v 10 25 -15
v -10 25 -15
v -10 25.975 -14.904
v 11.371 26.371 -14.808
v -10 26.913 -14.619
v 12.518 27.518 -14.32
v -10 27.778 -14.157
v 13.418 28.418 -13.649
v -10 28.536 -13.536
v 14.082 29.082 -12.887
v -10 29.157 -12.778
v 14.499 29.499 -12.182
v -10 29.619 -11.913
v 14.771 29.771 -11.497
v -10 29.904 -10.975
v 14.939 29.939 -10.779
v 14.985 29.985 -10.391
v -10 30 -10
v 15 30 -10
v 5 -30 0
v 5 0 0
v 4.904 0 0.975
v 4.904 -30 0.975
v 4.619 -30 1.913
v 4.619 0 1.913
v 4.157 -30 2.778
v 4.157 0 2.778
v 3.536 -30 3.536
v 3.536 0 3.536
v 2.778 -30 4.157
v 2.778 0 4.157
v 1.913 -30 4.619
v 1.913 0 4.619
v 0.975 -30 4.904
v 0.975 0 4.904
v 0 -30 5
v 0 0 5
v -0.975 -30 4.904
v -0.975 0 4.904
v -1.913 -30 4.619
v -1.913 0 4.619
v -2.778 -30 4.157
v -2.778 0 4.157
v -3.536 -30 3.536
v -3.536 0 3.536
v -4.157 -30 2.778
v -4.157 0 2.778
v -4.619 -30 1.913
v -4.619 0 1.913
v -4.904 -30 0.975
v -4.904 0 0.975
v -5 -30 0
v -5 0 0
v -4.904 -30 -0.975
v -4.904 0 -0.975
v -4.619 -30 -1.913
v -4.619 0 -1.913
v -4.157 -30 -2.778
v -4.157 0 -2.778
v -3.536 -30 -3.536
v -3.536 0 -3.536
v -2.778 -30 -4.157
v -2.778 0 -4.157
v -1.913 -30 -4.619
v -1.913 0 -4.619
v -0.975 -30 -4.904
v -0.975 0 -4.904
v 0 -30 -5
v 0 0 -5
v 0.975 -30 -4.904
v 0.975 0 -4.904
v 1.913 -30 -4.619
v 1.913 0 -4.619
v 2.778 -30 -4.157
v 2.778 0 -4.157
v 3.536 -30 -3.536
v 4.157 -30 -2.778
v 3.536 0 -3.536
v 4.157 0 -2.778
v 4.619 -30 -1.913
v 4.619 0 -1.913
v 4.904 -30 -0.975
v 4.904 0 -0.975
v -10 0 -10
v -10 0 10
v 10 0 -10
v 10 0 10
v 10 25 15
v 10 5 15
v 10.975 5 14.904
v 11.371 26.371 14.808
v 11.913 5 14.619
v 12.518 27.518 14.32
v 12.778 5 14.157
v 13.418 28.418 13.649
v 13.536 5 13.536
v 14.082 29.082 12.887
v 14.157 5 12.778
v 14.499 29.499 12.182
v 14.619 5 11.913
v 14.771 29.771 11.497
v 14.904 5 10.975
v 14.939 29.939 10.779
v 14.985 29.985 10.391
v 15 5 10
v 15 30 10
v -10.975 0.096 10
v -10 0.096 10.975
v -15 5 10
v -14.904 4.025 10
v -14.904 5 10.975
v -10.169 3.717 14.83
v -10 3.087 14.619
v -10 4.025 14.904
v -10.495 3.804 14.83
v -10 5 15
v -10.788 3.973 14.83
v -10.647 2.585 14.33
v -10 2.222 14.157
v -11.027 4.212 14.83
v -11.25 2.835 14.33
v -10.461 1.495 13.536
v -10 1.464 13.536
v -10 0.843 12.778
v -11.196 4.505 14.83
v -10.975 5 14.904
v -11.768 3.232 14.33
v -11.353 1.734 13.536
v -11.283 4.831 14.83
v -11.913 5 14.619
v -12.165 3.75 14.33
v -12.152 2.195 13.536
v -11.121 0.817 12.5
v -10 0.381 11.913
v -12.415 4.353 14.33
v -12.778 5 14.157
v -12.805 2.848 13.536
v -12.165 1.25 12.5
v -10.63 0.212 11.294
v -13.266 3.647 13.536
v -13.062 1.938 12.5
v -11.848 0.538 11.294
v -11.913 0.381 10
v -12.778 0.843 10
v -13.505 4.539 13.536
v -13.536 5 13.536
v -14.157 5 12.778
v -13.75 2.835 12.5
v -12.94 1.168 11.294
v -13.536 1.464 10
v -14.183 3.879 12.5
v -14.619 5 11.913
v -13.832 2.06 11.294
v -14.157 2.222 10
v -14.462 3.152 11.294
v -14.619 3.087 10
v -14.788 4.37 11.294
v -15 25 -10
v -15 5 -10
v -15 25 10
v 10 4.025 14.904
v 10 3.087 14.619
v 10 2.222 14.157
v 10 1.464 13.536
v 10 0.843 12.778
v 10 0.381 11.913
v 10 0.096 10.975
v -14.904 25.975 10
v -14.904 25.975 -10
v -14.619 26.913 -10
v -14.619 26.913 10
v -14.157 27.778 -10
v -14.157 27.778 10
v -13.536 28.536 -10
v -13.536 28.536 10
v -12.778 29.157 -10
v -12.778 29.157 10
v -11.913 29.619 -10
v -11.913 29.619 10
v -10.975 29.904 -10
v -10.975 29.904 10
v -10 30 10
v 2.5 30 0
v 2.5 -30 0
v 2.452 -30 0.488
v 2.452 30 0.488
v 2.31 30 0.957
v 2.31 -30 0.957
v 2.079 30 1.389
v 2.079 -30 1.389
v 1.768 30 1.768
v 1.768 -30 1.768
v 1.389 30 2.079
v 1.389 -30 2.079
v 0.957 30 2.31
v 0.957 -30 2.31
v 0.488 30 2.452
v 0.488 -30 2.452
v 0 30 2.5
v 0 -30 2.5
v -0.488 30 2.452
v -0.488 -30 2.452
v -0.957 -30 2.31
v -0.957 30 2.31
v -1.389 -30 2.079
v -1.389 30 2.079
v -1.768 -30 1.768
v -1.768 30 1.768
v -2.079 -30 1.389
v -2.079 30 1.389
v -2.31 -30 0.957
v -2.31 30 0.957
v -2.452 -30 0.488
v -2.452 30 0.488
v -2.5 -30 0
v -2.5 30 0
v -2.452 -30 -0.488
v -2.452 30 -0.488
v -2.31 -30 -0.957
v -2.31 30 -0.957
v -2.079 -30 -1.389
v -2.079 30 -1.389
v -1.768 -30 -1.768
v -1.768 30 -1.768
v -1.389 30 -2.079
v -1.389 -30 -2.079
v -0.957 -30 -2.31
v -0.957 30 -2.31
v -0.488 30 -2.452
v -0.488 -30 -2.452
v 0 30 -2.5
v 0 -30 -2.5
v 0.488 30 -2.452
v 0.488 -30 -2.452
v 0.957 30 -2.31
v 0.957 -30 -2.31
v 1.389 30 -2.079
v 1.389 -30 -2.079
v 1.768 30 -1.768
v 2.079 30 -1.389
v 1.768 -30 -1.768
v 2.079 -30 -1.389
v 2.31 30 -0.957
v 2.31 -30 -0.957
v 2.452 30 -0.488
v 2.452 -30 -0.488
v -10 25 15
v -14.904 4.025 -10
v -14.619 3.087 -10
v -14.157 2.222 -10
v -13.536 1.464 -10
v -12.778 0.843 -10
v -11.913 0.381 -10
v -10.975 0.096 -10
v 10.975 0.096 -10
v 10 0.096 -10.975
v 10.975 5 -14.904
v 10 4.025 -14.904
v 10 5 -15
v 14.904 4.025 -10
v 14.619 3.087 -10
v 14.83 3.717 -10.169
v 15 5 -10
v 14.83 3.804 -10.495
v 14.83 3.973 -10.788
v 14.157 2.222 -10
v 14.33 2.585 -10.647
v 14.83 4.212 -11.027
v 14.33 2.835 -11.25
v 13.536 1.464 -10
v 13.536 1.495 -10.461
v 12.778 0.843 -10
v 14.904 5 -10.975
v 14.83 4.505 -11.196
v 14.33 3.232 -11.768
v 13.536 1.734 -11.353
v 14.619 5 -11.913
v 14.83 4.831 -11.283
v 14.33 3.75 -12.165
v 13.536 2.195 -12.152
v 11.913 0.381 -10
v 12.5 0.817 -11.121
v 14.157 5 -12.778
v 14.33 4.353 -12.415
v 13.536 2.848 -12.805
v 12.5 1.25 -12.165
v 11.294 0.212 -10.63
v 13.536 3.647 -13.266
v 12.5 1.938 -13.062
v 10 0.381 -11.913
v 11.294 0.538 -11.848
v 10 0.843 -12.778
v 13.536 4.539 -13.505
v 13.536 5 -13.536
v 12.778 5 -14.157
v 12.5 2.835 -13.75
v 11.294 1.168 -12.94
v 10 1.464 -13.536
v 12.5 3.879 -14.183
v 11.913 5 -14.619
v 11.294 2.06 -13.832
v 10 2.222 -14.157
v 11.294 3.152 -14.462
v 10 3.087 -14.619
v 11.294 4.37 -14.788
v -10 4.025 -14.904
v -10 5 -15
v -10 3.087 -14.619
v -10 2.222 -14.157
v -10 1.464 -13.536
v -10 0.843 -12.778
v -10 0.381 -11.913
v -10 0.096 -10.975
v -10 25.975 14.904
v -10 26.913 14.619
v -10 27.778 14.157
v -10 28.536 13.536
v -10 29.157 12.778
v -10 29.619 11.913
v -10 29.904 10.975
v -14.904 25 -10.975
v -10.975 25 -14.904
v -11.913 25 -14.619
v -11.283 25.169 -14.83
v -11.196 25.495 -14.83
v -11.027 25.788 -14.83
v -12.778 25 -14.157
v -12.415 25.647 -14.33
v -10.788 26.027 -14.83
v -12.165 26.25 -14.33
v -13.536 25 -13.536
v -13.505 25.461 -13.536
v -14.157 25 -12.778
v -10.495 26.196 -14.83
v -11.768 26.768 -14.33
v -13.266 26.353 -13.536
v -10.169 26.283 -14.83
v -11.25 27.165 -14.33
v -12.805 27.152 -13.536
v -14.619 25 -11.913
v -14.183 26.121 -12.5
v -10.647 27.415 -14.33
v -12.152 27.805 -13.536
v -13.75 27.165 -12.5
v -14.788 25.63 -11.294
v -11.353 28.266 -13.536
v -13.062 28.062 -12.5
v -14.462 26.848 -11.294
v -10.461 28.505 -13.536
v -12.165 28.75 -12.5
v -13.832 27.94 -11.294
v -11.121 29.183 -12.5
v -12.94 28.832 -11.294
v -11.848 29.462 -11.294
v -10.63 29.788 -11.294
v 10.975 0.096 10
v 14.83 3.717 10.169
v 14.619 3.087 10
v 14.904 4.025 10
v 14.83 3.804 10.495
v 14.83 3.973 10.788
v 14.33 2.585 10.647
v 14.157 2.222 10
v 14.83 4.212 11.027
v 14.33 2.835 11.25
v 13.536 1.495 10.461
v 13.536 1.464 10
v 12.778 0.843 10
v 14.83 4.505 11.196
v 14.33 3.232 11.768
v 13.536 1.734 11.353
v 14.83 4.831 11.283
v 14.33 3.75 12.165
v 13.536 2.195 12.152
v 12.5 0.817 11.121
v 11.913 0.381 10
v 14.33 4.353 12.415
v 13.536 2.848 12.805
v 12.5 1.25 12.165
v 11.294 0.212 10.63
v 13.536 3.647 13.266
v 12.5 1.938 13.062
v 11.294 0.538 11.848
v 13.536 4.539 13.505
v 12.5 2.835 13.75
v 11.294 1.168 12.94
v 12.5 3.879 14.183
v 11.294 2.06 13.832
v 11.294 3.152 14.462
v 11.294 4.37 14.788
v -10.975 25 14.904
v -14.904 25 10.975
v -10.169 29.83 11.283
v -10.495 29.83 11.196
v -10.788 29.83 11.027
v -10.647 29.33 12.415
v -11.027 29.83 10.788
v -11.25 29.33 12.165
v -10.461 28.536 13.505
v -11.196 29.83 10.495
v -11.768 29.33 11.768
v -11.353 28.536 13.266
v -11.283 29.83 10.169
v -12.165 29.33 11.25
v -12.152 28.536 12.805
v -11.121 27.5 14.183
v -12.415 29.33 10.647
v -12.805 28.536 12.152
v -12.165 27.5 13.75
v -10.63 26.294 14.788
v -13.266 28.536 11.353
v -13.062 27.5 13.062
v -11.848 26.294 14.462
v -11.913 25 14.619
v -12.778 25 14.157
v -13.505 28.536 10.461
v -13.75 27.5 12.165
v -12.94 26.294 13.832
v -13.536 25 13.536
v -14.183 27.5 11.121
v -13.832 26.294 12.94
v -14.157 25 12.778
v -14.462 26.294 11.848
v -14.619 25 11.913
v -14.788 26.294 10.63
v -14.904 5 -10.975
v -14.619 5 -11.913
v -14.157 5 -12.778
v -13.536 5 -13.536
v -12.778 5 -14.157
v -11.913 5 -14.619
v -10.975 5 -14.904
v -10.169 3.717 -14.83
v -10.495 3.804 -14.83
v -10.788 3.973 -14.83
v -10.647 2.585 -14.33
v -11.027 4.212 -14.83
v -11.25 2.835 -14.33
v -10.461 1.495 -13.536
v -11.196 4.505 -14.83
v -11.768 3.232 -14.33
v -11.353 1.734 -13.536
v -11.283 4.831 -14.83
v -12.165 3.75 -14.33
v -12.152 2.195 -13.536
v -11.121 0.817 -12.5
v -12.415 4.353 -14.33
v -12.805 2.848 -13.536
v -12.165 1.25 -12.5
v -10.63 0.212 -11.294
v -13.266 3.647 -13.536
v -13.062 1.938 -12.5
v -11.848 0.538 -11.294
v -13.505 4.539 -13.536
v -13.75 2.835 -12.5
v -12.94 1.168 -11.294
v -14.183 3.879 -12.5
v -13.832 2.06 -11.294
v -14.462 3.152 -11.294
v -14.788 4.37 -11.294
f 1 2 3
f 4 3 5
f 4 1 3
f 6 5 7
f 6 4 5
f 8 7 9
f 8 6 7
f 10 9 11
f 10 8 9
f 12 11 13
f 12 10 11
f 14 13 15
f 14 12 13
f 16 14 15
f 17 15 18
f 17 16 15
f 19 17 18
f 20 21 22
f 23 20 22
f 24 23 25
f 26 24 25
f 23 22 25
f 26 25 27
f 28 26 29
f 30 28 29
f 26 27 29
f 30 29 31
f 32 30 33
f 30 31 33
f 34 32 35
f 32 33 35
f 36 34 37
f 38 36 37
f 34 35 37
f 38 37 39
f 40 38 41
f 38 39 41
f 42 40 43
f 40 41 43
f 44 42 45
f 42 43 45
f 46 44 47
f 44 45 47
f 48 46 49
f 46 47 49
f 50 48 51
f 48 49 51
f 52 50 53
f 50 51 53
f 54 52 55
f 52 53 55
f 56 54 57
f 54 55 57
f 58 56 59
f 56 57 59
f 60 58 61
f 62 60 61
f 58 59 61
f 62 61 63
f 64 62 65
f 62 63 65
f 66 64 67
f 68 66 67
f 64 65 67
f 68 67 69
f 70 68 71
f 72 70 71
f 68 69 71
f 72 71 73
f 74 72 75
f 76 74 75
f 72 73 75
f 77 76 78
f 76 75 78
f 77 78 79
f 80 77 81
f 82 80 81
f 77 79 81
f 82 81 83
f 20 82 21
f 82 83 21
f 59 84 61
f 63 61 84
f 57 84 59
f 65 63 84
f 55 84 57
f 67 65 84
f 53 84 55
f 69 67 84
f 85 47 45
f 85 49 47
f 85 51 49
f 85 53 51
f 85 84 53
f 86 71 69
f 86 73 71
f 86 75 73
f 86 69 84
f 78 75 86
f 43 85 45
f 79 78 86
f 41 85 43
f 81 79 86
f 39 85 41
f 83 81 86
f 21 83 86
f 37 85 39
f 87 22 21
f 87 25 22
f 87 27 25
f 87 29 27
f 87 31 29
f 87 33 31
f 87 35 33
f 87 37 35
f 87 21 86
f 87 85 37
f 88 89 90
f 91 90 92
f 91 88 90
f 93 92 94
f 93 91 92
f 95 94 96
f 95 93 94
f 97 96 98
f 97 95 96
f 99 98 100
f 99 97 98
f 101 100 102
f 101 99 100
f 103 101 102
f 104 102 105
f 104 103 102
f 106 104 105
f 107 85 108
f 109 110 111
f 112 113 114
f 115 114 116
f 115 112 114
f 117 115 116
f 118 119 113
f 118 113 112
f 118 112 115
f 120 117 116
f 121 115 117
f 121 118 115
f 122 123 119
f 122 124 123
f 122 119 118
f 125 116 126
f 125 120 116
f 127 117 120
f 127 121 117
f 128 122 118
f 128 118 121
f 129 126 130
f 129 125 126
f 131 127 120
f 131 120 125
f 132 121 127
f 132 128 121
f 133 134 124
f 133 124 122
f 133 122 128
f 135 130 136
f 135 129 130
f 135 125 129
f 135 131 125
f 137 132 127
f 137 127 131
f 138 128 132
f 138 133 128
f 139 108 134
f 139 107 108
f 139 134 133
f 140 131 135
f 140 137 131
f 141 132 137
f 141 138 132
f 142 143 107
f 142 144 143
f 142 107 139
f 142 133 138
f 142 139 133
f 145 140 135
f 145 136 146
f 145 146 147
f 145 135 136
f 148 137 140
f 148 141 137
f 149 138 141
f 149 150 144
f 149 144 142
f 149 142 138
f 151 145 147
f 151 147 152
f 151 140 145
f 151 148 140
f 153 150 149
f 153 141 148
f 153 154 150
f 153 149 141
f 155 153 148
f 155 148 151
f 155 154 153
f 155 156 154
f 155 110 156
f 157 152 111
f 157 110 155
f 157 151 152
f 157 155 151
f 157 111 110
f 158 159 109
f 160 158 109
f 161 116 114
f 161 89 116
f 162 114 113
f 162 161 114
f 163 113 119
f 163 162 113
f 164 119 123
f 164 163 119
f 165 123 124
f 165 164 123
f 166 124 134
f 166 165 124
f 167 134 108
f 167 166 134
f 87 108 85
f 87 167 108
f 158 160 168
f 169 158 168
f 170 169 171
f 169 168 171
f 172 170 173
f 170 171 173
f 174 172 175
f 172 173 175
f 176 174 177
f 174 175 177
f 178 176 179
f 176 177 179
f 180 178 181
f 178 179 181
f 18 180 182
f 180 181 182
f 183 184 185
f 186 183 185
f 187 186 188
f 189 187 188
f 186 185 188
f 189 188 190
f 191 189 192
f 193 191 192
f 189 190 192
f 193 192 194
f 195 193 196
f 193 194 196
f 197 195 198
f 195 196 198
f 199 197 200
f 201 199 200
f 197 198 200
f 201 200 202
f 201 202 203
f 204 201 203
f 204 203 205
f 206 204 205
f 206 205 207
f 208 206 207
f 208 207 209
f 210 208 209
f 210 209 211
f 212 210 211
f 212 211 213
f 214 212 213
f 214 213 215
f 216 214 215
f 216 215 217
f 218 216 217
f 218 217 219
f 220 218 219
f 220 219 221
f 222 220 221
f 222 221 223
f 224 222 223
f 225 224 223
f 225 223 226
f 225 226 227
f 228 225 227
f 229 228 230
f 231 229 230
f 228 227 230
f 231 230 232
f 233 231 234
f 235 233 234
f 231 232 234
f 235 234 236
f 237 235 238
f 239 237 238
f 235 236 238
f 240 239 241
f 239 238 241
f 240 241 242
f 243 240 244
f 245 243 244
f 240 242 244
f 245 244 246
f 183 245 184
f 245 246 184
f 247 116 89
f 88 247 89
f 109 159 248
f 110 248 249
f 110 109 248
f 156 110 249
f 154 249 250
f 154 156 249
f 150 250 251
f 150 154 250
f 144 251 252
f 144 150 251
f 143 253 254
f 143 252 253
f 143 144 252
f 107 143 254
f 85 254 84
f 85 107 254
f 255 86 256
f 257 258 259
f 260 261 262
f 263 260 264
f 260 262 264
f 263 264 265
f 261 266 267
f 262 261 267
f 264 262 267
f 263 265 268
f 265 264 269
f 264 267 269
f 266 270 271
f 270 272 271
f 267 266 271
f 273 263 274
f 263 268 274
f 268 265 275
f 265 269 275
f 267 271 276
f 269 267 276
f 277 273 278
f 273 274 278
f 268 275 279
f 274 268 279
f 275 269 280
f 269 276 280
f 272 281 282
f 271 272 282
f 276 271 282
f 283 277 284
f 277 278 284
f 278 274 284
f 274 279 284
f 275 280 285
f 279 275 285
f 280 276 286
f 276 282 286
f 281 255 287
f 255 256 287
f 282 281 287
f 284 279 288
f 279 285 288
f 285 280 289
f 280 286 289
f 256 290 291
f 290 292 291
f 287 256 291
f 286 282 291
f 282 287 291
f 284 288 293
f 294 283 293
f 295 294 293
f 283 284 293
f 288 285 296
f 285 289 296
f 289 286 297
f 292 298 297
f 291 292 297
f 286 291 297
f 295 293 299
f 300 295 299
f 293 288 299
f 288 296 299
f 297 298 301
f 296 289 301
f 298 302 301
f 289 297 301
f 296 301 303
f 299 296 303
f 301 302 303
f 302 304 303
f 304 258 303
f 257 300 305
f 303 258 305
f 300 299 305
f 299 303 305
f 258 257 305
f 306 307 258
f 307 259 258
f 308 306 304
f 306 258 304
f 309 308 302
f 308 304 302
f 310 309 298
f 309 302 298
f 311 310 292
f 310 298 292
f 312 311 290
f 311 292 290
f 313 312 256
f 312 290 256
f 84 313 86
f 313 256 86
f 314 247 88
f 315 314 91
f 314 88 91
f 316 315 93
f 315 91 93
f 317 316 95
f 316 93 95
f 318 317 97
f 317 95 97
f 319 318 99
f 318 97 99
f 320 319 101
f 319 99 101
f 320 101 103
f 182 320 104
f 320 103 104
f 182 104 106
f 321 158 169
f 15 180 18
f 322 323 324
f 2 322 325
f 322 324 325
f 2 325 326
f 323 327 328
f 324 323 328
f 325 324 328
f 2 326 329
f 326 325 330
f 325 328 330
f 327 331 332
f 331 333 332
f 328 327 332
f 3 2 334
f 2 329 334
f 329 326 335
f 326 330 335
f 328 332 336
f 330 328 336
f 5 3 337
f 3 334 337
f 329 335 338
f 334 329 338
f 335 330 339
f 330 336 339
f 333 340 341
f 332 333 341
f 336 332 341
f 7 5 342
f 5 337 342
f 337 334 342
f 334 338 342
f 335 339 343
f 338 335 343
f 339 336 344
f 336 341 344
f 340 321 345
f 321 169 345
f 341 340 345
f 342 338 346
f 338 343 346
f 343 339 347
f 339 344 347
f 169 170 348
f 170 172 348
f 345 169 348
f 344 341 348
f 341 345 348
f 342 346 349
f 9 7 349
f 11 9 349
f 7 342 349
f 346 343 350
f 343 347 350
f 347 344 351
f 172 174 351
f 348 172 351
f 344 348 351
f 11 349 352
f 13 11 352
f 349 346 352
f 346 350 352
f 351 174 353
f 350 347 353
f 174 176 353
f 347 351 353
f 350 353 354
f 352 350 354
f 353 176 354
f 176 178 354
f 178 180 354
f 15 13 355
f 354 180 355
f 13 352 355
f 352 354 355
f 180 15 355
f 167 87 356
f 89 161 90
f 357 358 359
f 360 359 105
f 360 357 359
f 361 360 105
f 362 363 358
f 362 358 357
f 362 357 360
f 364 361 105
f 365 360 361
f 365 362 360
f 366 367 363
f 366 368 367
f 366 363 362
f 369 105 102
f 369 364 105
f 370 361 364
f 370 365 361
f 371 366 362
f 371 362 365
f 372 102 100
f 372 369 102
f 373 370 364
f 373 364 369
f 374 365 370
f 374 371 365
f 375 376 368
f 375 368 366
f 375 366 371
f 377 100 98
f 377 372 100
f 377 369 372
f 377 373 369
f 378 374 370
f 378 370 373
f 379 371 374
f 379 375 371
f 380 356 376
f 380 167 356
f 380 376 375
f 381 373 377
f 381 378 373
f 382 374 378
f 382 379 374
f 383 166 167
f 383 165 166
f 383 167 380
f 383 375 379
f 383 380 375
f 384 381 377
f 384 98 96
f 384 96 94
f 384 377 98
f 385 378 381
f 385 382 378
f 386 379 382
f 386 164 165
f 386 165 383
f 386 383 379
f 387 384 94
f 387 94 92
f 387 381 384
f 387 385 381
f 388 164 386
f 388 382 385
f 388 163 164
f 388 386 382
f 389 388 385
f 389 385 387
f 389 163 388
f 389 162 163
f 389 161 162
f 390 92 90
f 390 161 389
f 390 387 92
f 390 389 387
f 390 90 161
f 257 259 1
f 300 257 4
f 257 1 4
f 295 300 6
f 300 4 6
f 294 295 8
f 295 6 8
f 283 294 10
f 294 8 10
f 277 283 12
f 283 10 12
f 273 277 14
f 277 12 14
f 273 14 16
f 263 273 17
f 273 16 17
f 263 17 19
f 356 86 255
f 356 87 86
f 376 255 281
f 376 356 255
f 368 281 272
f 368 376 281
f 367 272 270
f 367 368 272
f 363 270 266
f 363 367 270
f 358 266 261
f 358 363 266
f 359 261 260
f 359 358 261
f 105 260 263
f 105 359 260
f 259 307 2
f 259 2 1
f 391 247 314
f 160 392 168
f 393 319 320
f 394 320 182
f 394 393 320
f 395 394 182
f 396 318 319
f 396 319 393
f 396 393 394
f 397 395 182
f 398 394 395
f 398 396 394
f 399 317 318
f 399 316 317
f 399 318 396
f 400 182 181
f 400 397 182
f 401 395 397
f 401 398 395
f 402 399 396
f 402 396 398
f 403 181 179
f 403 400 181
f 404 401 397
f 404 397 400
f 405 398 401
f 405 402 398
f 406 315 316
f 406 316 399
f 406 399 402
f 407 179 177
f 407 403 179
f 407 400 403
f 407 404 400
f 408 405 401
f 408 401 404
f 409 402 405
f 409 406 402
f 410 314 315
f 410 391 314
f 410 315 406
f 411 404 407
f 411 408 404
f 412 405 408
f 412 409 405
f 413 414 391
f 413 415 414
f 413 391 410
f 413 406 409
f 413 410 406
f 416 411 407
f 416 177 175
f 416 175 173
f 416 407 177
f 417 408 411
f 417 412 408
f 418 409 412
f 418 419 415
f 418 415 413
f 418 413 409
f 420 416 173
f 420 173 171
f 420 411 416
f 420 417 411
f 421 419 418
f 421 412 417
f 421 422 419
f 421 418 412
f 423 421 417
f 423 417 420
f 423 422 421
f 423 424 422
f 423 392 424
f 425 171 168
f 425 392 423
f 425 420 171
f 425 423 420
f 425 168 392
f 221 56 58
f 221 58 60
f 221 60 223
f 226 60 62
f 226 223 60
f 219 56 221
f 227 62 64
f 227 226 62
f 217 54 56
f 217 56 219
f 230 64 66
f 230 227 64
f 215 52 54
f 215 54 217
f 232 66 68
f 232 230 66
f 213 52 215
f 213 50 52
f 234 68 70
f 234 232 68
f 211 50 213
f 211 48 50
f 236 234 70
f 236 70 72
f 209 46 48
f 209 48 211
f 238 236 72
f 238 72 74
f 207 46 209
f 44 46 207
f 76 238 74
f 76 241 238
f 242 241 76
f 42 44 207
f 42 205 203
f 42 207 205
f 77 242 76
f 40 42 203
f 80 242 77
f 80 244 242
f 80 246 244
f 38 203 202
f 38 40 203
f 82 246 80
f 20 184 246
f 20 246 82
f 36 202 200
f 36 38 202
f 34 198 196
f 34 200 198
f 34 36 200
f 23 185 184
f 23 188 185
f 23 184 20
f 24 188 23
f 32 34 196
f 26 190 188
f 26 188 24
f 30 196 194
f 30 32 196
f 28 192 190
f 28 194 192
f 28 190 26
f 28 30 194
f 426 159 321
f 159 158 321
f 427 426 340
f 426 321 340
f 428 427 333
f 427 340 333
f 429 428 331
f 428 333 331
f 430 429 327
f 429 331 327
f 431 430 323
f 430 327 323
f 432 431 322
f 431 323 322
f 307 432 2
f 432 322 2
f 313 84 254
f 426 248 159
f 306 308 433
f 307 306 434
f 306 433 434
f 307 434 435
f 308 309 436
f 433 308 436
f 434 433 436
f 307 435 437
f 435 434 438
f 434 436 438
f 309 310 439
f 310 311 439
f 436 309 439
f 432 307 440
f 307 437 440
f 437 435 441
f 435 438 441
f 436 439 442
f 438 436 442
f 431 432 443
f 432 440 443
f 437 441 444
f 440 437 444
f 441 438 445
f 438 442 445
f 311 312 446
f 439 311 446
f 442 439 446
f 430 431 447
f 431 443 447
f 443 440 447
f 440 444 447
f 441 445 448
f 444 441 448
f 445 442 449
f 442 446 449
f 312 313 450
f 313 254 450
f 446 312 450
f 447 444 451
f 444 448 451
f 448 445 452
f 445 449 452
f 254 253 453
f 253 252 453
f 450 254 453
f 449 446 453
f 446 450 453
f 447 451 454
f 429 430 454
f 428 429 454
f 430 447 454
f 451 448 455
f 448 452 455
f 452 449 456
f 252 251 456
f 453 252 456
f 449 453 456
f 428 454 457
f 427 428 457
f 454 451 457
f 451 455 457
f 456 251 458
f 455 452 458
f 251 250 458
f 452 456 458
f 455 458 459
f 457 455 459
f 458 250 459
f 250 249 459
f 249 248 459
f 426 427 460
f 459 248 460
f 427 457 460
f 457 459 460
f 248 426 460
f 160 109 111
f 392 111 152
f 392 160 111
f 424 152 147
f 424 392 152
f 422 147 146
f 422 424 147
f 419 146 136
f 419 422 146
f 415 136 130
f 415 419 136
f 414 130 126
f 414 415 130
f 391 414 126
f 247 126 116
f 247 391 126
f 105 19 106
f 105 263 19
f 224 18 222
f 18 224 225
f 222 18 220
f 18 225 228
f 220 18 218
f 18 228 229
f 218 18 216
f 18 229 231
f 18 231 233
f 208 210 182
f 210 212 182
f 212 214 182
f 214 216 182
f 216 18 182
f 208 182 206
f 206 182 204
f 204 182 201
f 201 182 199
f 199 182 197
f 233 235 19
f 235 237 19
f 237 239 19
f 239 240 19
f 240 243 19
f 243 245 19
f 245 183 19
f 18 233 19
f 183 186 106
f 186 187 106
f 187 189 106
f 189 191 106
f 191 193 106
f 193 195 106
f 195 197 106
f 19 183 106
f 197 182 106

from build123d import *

# Parameters (mm, degrees)
F0_W     = 30
F0_H     = 30
F1_DEPTH = 30
F2_R     = 5
F3_DEPTH = 30
F4_R     = 2.5
F5_DEPTH = 60.001
F6_R     = 5


with BuildPart() as f1:
    # F0 (on Front) → F1 (new body)
    with BuildSketch(Plane.XZ):
        Rectangle(F0_W, F0_H)
    extrude(amount=-F1_DEPTH)

    # F2 (on face) → F3 (join)
    with BuildSketch(Plane.XZ):
        Circle(F2_R)
    extrude(amount=F3_DEPTH)

    # F4 (on face) → F5 (cut, through all)
    with BuildSketch(Plane.XZ.offset(30)):
        Circle(F4_R)
    extrude(amount=-F5_DEPTH, mode=Mode.SUBTRACT)

    # F6
    f6_edges = [f1.edges().sort_by_distance(p)[0] for p in [
        (-15, 0, 0),
        (0, 0, -15),
        (0, 0, 15),
        (15, 0, 0),
        (-15, 15, 15),
        (15, 15, 15),
        (0, 30, 15),
        (-15, 30, 0),
        (-15, 15, -15),
        (0, 30, -15),
        (15, 15, -15),
    ]]
    fillet(f6_edges, radius=F6_R)


solid = f1.part
